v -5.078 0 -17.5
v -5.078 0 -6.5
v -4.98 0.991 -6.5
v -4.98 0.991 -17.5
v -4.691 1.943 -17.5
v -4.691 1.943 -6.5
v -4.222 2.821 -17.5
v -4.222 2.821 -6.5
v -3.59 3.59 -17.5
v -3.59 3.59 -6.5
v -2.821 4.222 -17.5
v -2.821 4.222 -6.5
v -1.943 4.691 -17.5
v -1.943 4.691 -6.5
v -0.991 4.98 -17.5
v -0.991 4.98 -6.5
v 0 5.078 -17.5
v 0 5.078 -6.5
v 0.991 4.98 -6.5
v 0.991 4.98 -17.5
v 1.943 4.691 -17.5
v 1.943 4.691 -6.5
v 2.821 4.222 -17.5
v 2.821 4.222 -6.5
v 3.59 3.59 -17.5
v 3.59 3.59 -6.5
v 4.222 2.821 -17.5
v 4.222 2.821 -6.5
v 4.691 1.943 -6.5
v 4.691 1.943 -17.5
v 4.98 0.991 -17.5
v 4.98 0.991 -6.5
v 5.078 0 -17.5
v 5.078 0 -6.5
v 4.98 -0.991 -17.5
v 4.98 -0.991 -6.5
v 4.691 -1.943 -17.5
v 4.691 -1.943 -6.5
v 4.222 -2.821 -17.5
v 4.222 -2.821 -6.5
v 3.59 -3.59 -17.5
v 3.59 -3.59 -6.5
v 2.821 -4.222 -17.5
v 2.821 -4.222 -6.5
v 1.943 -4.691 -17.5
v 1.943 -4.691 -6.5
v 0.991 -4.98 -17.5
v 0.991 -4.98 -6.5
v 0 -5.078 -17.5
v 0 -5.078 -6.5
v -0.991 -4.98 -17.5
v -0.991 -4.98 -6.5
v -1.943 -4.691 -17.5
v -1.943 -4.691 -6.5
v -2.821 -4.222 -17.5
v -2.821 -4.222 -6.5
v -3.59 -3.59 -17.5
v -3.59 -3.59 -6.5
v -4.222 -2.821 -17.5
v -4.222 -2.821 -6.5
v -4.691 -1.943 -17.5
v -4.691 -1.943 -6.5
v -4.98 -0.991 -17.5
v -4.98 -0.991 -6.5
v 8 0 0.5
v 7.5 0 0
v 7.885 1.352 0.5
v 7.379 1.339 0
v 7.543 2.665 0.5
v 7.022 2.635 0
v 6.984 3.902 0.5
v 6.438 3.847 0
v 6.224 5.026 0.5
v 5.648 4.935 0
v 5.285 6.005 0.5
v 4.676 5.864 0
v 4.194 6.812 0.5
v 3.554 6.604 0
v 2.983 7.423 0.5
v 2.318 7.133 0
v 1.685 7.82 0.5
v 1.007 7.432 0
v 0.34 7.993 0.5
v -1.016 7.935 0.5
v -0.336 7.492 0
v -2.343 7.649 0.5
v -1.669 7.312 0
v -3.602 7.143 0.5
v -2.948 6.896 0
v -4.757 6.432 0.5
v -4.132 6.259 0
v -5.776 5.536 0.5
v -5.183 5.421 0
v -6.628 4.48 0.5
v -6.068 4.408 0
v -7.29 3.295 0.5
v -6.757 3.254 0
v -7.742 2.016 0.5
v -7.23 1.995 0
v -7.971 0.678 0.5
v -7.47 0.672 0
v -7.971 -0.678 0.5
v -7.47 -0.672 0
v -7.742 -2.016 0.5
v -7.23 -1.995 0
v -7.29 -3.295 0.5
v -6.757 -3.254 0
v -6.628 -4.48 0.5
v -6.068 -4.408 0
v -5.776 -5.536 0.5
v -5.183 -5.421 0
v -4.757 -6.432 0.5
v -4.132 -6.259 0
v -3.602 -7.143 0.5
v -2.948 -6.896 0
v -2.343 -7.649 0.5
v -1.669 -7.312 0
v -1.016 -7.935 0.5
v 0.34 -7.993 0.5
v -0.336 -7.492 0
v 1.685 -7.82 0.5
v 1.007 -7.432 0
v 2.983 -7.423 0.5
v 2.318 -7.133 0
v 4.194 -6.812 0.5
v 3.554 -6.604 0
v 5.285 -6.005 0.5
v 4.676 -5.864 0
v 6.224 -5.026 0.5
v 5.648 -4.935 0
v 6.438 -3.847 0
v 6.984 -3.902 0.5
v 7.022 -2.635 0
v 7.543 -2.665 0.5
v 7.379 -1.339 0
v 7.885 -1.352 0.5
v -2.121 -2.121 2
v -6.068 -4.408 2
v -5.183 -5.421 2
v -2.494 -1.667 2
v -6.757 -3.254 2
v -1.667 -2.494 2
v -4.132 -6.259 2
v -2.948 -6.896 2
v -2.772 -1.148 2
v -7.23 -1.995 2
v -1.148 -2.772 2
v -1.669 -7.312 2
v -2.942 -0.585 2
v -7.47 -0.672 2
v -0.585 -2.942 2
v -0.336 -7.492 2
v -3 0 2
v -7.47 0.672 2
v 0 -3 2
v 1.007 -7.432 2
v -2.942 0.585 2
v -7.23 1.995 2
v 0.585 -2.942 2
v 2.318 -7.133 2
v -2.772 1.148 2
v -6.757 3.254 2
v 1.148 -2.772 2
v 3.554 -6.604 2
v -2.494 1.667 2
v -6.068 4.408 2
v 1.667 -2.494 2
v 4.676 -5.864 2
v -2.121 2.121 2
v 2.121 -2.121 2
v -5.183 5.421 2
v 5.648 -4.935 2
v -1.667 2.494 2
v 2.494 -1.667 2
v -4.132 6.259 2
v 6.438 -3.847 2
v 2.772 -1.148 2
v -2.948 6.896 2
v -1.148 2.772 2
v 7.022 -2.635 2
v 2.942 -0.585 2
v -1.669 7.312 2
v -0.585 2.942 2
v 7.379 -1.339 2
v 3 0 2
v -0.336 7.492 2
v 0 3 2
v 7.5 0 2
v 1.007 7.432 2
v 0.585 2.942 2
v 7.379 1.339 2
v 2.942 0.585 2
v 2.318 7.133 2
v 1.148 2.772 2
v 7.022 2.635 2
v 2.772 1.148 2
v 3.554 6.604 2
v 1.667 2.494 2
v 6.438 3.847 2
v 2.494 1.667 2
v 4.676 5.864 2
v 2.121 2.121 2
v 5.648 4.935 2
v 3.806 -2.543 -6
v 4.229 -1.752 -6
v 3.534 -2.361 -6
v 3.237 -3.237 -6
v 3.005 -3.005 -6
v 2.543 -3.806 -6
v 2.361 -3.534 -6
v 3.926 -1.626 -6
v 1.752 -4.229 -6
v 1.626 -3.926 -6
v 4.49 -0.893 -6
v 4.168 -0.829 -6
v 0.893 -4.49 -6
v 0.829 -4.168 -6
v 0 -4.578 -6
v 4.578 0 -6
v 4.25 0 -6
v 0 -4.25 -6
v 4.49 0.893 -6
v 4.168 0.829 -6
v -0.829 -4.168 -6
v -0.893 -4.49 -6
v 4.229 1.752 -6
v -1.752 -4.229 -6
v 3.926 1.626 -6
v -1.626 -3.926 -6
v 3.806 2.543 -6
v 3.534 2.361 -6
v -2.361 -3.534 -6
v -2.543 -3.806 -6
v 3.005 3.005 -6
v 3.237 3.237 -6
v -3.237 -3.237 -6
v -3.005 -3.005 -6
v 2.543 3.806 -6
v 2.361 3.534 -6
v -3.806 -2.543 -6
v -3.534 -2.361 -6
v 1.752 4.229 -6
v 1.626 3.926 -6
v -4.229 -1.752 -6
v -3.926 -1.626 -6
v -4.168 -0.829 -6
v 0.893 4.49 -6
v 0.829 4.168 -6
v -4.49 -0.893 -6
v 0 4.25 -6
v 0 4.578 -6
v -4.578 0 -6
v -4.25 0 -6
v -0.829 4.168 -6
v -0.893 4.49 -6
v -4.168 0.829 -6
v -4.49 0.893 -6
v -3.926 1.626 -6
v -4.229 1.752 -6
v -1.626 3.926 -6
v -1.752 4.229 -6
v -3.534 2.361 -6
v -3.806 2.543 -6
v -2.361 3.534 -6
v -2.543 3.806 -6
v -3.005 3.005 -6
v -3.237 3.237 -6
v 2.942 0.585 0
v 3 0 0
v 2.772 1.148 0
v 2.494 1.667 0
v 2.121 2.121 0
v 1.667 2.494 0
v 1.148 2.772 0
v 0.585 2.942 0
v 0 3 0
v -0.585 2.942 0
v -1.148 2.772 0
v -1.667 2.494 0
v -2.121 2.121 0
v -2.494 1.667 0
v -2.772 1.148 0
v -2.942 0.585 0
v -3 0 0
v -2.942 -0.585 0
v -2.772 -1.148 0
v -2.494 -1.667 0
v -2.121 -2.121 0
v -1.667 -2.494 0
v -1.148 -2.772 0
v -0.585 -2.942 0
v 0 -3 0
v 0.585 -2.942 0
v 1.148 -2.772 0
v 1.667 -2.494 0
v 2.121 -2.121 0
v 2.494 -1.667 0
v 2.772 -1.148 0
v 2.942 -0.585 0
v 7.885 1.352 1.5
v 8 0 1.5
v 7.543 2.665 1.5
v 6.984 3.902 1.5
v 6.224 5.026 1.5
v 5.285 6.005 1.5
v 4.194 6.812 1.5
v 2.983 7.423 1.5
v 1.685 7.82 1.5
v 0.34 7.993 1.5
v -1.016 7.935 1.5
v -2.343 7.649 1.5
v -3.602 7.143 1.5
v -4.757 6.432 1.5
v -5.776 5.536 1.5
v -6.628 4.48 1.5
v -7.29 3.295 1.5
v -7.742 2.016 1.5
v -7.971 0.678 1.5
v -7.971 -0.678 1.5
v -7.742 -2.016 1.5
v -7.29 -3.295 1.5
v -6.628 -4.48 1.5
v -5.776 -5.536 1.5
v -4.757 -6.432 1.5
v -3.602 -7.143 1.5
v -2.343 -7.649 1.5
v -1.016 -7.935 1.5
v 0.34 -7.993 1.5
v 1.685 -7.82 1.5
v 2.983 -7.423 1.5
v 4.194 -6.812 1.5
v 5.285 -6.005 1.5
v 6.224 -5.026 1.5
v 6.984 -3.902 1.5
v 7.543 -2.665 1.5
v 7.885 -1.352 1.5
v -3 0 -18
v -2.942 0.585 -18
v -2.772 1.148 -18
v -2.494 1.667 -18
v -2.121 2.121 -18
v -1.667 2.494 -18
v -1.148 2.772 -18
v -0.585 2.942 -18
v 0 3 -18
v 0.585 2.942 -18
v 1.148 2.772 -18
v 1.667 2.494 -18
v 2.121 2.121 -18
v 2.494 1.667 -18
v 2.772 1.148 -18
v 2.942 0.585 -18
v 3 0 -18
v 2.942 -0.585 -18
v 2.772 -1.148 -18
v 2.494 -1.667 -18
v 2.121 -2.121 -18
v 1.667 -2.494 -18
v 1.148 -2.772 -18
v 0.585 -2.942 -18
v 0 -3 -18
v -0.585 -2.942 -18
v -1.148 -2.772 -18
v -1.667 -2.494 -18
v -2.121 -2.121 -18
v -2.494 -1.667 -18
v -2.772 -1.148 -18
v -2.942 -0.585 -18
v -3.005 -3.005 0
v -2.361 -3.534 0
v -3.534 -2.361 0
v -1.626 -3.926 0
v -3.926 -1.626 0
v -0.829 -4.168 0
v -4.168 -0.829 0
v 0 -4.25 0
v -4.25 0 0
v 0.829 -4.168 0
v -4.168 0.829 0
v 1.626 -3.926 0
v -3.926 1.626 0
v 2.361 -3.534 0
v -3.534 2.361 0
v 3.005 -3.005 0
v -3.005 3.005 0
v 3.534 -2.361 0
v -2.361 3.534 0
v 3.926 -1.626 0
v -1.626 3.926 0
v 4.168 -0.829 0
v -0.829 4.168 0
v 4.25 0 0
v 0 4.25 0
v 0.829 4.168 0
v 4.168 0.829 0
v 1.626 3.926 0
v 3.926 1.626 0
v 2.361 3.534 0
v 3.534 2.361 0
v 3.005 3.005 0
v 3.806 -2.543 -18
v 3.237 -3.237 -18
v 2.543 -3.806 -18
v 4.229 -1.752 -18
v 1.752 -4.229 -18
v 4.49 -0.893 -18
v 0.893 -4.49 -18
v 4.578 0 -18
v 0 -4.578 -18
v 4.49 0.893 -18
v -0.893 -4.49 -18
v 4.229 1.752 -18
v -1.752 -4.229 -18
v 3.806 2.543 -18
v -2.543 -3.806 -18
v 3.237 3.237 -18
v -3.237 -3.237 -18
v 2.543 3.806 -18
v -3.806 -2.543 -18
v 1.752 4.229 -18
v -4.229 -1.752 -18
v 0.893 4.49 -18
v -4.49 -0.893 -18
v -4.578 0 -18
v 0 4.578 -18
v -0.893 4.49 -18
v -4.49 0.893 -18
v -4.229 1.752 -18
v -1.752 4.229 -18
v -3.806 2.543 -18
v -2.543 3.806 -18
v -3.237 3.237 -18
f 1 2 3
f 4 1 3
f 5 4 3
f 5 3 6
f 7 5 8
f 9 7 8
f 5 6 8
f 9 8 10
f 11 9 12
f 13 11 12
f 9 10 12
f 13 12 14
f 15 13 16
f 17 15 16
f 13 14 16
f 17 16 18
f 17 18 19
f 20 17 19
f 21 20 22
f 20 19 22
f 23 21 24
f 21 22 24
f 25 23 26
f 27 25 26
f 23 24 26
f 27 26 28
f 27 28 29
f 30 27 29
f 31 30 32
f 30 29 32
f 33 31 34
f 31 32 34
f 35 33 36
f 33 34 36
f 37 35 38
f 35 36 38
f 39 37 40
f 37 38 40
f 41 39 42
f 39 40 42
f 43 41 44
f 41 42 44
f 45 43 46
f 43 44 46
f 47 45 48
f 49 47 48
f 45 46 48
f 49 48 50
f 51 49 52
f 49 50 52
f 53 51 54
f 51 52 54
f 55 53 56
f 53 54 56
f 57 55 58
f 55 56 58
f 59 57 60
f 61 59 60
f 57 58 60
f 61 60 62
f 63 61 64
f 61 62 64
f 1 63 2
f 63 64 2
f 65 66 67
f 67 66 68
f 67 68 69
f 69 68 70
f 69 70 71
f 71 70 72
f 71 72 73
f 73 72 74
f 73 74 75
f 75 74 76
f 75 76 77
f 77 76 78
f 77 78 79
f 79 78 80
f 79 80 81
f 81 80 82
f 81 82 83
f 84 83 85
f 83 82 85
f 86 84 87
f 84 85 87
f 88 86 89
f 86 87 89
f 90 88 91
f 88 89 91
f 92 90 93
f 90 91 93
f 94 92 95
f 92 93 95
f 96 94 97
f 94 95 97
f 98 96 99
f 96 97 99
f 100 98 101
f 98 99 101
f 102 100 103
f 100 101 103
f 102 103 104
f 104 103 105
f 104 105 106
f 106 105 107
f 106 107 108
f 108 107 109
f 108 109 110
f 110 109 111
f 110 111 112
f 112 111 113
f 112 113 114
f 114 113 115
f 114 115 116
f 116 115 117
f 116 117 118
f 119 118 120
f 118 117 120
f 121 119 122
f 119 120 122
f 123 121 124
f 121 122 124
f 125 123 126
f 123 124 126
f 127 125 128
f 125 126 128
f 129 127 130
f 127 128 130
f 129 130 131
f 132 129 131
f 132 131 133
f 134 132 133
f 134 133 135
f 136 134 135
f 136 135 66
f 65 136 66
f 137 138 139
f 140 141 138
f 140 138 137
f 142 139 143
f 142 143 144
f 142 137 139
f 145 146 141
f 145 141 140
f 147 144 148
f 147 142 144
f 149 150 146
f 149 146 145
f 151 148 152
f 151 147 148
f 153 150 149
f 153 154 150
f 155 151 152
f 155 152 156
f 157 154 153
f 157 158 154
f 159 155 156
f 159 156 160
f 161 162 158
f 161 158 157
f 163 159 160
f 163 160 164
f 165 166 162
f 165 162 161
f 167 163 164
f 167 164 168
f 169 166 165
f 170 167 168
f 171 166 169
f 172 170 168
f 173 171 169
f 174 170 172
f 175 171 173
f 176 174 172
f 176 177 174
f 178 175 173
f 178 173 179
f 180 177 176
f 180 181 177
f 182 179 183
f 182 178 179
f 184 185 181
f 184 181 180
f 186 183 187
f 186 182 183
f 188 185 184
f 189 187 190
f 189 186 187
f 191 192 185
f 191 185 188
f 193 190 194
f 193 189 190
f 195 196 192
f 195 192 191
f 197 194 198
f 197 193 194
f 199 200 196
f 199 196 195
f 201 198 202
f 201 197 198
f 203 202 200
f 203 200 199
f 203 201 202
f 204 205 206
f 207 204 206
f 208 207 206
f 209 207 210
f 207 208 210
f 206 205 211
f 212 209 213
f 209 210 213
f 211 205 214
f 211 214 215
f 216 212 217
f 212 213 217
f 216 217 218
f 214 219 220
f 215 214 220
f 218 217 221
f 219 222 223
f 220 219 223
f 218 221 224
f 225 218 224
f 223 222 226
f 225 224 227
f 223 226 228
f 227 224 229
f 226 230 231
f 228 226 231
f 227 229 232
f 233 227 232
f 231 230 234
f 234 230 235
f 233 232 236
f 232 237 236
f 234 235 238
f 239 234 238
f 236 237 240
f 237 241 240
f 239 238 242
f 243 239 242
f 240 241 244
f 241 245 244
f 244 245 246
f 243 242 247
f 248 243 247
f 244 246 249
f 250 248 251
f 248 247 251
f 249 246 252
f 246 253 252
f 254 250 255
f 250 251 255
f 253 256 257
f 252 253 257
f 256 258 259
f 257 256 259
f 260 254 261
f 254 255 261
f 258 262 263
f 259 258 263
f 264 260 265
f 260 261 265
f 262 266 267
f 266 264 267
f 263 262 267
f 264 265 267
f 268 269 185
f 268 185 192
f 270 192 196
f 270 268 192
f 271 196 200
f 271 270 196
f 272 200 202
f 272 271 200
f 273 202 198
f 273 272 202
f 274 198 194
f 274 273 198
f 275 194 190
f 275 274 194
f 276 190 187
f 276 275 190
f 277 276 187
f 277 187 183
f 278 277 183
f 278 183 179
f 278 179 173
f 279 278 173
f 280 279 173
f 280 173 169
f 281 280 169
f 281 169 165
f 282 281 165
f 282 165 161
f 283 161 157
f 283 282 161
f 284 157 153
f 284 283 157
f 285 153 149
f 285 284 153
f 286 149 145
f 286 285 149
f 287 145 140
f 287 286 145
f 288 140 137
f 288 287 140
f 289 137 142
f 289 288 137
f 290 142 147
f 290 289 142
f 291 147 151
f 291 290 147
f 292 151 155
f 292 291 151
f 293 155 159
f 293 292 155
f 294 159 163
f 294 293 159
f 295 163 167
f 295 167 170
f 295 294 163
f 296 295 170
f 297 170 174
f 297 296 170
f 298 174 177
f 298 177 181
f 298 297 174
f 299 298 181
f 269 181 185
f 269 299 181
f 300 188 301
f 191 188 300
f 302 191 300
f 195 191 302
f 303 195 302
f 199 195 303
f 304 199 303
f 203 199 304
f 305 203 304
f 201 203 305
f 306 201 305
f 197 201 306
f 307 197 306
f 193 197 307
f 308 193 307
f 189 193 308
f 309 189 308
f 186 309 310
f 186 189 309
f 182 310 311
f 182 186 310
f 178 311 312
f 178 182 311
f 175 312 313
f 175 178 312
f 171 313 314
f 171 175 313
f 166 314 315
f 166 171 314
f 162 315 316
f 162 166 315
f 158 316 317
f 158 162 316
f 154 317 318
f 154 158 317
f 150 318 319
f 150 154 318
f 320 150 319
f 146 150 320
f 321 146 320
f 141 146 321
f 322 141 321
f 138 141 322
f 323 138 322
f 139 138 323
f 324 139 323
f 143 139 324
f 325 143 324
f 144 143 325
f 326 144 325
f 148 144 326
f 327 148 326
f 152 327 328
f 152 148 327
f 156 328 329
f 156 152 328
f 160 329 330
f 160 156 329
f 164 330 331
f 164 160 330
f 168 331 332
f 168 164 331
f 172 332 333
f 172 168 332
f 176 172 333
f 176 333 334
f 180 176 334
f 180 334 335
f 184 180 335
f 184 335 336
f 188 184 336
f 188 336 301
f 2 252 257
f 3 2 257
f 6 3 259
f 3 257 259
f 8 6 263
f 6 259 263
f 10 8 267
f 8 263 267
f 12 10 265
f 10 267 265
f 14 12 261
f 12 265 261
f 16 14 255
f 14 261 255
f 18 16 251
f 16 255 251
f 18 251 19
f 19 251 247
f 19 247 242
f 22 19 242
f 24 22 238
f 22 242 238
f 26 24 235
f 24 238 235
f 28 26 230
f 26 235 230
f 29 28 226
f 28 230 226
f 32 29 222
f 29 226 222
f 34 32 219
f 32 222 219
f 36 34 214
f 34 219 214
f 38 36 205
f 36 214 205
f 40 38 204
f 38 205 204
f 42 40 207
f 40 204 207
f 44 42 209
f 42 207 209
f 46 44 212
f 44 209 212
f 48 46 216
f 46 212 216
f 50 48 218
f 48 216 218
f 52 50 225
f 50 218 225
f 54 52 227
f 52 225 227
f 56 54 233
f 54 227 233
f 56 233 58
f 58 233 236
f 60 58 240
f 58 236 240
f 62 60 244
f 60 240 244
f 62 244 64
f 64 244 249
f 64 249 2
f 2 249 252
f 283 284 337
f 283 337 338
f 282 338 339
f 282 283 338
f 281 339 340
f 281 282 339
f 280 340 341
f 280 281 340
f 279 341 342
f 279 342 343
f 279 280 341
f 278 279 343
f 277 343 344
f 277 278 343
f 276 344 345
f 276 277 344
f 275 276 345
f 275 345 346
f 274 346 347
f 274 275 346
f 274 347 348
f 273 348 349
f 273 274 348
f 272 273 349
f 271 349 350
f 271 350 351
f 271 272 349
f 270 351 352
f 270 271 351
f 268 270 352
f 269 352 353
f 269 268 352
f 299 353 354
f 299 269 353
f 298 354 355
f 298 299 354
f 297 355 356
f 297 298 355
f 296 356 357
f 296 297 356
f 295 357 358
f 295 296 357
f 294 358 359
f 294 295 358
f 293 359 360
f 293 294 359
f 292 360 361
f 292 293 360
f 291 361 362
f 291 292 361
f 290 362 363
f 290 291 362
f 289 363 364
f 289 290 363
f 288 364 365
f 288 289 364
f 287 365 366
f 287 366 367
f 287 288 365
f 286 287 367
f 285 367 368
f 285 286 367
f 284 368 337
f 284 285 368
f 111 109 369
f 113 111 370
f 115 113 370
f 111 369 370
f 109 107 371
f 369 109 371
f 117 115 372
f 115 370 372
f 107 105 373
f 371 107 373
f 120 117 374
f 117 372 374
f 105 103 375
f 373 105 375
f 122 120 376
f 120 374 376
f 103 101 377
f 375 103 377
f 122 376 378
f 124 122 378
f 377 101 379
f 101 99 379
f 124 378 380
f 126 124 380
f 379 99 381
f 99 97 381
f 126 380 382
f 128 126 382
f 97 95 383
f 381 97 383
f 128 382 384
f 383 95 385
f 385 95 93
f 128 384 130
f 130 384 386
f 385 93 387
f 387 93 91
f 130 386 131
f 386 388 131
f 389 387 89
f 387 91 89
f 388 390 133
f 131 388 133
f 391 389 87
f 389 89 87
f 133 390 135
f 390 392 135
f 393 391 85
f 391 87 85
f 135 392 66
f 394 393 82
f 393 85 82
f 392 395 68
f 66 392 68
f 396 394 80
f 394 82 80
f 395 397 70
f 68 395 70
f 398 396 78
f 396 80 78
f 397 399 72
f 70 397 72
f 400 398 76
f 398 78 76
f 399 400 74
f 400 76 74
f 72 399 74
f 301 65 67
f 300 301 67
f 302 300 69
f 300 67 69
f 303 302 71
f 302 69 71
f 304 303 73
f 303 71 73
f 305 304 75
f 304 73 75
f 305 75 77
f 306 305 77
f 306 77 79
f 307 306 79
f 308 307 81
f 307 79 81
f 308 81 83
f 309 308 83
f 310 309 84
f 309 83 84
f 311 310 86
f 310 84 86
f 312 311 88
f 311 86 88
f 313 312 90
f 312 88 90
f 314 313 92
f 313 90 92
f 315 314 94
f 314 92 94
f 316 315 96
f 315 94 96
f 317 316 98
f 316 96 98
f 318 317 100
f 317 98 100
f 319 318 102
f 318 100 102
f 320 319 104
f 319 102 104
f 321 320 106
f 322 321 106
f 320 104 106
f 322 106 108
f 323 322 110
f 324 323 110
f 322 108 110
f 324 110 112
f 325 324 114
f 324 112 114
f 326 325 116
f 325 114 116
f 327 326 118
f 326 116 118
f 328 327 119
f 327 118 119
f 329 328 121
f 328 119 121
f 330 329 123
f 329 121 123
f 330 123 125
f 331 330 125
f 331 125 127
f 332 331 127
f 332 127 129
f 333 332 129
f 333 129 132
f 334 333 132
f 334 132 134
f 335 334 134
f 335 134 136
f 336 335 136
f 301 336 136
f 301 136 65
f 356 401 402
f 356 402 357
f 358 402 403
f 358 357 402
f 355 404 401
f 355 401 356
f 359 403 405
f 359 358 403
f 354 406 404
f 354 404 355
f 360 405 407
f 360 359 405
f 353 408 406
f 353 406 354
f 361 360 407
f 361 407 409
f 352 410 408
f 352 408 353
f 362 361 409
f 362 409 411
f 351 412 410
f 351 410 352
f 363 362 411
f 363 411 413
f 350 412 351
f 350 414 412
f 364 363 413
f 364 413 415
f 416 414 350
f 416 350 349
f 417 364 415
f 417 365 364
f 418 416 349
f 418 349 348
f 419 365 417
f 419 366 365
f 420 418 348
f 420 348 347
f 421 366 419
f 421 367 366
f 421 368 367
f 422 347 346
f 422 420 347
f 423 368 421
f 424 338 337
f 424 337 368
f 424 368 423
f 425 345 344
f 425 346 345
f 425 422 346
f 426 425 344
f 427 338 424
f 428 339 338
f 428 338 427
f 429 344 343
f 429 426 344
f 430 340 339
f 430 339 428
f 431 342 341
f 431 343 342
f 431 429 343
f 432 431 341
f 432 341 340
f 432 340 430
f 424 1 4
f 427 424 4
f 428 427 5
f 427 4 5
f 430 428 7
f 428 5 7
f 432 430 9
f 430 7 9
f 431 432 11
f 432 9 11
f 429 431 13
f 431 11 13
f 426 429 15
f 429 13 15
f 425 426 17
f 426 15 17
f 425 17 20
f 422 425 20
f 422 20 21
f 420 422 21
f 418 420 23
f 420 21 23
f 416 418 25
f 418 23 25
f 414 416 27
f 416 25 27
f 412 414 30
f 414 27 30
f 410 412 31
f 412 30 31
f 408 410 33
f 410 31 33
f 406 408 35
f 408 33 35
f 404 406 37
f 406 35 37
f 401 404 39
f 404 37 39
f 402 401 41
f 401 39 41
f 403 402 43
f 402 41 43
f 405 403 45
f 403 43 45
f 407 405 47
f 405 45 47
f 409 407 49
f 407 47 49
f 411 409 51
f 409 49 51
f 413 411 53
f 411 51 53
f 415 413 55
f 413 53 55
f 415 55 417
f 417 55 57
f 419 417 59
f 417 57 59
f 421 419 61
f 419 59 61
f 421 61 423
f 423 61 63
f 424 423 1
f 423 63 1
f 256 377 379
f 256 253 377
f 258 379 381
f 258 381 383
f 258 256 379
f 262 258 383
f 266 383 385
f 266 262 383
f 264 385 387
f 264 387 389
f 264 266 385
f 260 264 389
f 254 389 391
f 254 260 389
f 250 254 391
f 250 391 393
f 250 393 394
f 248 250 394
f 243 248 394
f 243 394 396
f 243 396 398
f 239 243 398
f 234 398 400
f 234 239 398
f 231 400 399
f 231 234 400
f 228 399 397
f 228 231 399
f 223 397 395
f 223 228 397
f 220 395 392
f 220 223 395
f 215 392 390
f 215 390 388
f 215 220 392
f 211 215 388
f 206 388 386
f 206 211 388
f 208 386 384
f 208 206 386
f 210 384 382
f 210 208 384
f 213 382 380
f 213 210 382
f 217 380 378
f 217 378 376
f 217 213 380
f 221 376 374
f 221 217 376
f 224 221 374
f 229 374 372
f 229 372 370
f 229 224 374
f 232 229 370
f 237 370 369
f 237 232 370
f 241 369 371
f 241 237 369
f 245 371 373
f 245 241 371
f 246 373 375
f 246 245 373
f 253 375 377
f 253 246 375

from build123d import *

# Parameters (mm, degrees)
F0_R     = 8
F0_R_2   = 3
F2_DEPTH = 2
F3_SIZE2 = 0.5
F3_SIZE  = 0.5
F1_W     = 0.8275934942
F1_H     = 12
F5_SIZE2 = 0.5
F5_SIZE  = 0.5


with BuildPart() as f2:
    # F0 (on Top) → F2 (new body)
    with BuildSketch(Plane.XY):
        Circle(F0_R)
        Circle(F0_R_2, mode=Mode.SUBTRACT)
    extrude(amount=F2_DEPTH)

    # F3
    f3_edges = [f2.edges().sort_by_distance(p)[0] for p in [
        (8, 0, 1),
        (-8, 0, 0),
        (-8, 0, 2),
    ]]
    chamfer(f3_edges, length=F3_SIZE, length2=F3_SIZE2)

    # F1 (on Front) → F4 (revolve)
    with BuildSketch(Plane.XZ):
        Polygon((-3, -18), (-3, 0), (-4.25, 0), (-4.25, -6), (-4.25, -18), align=None)
        with Locations((-4.6637967471, -12)):
            Rectangle(F1_W, F1_H)
    revolve(axis=Axis((0, 0, -9), (0, 0, -1)))

    # F5
    f5_edges = [f2.edges().sort_by_distance(p)[0] for p in [
        (5.077593, 0, -6),
        (5.077593, 0, -18),
    ]]
    chamfer(f5_edges, length=F5_SIZE, length2=F5_SIZE2)


solid = f2.part
